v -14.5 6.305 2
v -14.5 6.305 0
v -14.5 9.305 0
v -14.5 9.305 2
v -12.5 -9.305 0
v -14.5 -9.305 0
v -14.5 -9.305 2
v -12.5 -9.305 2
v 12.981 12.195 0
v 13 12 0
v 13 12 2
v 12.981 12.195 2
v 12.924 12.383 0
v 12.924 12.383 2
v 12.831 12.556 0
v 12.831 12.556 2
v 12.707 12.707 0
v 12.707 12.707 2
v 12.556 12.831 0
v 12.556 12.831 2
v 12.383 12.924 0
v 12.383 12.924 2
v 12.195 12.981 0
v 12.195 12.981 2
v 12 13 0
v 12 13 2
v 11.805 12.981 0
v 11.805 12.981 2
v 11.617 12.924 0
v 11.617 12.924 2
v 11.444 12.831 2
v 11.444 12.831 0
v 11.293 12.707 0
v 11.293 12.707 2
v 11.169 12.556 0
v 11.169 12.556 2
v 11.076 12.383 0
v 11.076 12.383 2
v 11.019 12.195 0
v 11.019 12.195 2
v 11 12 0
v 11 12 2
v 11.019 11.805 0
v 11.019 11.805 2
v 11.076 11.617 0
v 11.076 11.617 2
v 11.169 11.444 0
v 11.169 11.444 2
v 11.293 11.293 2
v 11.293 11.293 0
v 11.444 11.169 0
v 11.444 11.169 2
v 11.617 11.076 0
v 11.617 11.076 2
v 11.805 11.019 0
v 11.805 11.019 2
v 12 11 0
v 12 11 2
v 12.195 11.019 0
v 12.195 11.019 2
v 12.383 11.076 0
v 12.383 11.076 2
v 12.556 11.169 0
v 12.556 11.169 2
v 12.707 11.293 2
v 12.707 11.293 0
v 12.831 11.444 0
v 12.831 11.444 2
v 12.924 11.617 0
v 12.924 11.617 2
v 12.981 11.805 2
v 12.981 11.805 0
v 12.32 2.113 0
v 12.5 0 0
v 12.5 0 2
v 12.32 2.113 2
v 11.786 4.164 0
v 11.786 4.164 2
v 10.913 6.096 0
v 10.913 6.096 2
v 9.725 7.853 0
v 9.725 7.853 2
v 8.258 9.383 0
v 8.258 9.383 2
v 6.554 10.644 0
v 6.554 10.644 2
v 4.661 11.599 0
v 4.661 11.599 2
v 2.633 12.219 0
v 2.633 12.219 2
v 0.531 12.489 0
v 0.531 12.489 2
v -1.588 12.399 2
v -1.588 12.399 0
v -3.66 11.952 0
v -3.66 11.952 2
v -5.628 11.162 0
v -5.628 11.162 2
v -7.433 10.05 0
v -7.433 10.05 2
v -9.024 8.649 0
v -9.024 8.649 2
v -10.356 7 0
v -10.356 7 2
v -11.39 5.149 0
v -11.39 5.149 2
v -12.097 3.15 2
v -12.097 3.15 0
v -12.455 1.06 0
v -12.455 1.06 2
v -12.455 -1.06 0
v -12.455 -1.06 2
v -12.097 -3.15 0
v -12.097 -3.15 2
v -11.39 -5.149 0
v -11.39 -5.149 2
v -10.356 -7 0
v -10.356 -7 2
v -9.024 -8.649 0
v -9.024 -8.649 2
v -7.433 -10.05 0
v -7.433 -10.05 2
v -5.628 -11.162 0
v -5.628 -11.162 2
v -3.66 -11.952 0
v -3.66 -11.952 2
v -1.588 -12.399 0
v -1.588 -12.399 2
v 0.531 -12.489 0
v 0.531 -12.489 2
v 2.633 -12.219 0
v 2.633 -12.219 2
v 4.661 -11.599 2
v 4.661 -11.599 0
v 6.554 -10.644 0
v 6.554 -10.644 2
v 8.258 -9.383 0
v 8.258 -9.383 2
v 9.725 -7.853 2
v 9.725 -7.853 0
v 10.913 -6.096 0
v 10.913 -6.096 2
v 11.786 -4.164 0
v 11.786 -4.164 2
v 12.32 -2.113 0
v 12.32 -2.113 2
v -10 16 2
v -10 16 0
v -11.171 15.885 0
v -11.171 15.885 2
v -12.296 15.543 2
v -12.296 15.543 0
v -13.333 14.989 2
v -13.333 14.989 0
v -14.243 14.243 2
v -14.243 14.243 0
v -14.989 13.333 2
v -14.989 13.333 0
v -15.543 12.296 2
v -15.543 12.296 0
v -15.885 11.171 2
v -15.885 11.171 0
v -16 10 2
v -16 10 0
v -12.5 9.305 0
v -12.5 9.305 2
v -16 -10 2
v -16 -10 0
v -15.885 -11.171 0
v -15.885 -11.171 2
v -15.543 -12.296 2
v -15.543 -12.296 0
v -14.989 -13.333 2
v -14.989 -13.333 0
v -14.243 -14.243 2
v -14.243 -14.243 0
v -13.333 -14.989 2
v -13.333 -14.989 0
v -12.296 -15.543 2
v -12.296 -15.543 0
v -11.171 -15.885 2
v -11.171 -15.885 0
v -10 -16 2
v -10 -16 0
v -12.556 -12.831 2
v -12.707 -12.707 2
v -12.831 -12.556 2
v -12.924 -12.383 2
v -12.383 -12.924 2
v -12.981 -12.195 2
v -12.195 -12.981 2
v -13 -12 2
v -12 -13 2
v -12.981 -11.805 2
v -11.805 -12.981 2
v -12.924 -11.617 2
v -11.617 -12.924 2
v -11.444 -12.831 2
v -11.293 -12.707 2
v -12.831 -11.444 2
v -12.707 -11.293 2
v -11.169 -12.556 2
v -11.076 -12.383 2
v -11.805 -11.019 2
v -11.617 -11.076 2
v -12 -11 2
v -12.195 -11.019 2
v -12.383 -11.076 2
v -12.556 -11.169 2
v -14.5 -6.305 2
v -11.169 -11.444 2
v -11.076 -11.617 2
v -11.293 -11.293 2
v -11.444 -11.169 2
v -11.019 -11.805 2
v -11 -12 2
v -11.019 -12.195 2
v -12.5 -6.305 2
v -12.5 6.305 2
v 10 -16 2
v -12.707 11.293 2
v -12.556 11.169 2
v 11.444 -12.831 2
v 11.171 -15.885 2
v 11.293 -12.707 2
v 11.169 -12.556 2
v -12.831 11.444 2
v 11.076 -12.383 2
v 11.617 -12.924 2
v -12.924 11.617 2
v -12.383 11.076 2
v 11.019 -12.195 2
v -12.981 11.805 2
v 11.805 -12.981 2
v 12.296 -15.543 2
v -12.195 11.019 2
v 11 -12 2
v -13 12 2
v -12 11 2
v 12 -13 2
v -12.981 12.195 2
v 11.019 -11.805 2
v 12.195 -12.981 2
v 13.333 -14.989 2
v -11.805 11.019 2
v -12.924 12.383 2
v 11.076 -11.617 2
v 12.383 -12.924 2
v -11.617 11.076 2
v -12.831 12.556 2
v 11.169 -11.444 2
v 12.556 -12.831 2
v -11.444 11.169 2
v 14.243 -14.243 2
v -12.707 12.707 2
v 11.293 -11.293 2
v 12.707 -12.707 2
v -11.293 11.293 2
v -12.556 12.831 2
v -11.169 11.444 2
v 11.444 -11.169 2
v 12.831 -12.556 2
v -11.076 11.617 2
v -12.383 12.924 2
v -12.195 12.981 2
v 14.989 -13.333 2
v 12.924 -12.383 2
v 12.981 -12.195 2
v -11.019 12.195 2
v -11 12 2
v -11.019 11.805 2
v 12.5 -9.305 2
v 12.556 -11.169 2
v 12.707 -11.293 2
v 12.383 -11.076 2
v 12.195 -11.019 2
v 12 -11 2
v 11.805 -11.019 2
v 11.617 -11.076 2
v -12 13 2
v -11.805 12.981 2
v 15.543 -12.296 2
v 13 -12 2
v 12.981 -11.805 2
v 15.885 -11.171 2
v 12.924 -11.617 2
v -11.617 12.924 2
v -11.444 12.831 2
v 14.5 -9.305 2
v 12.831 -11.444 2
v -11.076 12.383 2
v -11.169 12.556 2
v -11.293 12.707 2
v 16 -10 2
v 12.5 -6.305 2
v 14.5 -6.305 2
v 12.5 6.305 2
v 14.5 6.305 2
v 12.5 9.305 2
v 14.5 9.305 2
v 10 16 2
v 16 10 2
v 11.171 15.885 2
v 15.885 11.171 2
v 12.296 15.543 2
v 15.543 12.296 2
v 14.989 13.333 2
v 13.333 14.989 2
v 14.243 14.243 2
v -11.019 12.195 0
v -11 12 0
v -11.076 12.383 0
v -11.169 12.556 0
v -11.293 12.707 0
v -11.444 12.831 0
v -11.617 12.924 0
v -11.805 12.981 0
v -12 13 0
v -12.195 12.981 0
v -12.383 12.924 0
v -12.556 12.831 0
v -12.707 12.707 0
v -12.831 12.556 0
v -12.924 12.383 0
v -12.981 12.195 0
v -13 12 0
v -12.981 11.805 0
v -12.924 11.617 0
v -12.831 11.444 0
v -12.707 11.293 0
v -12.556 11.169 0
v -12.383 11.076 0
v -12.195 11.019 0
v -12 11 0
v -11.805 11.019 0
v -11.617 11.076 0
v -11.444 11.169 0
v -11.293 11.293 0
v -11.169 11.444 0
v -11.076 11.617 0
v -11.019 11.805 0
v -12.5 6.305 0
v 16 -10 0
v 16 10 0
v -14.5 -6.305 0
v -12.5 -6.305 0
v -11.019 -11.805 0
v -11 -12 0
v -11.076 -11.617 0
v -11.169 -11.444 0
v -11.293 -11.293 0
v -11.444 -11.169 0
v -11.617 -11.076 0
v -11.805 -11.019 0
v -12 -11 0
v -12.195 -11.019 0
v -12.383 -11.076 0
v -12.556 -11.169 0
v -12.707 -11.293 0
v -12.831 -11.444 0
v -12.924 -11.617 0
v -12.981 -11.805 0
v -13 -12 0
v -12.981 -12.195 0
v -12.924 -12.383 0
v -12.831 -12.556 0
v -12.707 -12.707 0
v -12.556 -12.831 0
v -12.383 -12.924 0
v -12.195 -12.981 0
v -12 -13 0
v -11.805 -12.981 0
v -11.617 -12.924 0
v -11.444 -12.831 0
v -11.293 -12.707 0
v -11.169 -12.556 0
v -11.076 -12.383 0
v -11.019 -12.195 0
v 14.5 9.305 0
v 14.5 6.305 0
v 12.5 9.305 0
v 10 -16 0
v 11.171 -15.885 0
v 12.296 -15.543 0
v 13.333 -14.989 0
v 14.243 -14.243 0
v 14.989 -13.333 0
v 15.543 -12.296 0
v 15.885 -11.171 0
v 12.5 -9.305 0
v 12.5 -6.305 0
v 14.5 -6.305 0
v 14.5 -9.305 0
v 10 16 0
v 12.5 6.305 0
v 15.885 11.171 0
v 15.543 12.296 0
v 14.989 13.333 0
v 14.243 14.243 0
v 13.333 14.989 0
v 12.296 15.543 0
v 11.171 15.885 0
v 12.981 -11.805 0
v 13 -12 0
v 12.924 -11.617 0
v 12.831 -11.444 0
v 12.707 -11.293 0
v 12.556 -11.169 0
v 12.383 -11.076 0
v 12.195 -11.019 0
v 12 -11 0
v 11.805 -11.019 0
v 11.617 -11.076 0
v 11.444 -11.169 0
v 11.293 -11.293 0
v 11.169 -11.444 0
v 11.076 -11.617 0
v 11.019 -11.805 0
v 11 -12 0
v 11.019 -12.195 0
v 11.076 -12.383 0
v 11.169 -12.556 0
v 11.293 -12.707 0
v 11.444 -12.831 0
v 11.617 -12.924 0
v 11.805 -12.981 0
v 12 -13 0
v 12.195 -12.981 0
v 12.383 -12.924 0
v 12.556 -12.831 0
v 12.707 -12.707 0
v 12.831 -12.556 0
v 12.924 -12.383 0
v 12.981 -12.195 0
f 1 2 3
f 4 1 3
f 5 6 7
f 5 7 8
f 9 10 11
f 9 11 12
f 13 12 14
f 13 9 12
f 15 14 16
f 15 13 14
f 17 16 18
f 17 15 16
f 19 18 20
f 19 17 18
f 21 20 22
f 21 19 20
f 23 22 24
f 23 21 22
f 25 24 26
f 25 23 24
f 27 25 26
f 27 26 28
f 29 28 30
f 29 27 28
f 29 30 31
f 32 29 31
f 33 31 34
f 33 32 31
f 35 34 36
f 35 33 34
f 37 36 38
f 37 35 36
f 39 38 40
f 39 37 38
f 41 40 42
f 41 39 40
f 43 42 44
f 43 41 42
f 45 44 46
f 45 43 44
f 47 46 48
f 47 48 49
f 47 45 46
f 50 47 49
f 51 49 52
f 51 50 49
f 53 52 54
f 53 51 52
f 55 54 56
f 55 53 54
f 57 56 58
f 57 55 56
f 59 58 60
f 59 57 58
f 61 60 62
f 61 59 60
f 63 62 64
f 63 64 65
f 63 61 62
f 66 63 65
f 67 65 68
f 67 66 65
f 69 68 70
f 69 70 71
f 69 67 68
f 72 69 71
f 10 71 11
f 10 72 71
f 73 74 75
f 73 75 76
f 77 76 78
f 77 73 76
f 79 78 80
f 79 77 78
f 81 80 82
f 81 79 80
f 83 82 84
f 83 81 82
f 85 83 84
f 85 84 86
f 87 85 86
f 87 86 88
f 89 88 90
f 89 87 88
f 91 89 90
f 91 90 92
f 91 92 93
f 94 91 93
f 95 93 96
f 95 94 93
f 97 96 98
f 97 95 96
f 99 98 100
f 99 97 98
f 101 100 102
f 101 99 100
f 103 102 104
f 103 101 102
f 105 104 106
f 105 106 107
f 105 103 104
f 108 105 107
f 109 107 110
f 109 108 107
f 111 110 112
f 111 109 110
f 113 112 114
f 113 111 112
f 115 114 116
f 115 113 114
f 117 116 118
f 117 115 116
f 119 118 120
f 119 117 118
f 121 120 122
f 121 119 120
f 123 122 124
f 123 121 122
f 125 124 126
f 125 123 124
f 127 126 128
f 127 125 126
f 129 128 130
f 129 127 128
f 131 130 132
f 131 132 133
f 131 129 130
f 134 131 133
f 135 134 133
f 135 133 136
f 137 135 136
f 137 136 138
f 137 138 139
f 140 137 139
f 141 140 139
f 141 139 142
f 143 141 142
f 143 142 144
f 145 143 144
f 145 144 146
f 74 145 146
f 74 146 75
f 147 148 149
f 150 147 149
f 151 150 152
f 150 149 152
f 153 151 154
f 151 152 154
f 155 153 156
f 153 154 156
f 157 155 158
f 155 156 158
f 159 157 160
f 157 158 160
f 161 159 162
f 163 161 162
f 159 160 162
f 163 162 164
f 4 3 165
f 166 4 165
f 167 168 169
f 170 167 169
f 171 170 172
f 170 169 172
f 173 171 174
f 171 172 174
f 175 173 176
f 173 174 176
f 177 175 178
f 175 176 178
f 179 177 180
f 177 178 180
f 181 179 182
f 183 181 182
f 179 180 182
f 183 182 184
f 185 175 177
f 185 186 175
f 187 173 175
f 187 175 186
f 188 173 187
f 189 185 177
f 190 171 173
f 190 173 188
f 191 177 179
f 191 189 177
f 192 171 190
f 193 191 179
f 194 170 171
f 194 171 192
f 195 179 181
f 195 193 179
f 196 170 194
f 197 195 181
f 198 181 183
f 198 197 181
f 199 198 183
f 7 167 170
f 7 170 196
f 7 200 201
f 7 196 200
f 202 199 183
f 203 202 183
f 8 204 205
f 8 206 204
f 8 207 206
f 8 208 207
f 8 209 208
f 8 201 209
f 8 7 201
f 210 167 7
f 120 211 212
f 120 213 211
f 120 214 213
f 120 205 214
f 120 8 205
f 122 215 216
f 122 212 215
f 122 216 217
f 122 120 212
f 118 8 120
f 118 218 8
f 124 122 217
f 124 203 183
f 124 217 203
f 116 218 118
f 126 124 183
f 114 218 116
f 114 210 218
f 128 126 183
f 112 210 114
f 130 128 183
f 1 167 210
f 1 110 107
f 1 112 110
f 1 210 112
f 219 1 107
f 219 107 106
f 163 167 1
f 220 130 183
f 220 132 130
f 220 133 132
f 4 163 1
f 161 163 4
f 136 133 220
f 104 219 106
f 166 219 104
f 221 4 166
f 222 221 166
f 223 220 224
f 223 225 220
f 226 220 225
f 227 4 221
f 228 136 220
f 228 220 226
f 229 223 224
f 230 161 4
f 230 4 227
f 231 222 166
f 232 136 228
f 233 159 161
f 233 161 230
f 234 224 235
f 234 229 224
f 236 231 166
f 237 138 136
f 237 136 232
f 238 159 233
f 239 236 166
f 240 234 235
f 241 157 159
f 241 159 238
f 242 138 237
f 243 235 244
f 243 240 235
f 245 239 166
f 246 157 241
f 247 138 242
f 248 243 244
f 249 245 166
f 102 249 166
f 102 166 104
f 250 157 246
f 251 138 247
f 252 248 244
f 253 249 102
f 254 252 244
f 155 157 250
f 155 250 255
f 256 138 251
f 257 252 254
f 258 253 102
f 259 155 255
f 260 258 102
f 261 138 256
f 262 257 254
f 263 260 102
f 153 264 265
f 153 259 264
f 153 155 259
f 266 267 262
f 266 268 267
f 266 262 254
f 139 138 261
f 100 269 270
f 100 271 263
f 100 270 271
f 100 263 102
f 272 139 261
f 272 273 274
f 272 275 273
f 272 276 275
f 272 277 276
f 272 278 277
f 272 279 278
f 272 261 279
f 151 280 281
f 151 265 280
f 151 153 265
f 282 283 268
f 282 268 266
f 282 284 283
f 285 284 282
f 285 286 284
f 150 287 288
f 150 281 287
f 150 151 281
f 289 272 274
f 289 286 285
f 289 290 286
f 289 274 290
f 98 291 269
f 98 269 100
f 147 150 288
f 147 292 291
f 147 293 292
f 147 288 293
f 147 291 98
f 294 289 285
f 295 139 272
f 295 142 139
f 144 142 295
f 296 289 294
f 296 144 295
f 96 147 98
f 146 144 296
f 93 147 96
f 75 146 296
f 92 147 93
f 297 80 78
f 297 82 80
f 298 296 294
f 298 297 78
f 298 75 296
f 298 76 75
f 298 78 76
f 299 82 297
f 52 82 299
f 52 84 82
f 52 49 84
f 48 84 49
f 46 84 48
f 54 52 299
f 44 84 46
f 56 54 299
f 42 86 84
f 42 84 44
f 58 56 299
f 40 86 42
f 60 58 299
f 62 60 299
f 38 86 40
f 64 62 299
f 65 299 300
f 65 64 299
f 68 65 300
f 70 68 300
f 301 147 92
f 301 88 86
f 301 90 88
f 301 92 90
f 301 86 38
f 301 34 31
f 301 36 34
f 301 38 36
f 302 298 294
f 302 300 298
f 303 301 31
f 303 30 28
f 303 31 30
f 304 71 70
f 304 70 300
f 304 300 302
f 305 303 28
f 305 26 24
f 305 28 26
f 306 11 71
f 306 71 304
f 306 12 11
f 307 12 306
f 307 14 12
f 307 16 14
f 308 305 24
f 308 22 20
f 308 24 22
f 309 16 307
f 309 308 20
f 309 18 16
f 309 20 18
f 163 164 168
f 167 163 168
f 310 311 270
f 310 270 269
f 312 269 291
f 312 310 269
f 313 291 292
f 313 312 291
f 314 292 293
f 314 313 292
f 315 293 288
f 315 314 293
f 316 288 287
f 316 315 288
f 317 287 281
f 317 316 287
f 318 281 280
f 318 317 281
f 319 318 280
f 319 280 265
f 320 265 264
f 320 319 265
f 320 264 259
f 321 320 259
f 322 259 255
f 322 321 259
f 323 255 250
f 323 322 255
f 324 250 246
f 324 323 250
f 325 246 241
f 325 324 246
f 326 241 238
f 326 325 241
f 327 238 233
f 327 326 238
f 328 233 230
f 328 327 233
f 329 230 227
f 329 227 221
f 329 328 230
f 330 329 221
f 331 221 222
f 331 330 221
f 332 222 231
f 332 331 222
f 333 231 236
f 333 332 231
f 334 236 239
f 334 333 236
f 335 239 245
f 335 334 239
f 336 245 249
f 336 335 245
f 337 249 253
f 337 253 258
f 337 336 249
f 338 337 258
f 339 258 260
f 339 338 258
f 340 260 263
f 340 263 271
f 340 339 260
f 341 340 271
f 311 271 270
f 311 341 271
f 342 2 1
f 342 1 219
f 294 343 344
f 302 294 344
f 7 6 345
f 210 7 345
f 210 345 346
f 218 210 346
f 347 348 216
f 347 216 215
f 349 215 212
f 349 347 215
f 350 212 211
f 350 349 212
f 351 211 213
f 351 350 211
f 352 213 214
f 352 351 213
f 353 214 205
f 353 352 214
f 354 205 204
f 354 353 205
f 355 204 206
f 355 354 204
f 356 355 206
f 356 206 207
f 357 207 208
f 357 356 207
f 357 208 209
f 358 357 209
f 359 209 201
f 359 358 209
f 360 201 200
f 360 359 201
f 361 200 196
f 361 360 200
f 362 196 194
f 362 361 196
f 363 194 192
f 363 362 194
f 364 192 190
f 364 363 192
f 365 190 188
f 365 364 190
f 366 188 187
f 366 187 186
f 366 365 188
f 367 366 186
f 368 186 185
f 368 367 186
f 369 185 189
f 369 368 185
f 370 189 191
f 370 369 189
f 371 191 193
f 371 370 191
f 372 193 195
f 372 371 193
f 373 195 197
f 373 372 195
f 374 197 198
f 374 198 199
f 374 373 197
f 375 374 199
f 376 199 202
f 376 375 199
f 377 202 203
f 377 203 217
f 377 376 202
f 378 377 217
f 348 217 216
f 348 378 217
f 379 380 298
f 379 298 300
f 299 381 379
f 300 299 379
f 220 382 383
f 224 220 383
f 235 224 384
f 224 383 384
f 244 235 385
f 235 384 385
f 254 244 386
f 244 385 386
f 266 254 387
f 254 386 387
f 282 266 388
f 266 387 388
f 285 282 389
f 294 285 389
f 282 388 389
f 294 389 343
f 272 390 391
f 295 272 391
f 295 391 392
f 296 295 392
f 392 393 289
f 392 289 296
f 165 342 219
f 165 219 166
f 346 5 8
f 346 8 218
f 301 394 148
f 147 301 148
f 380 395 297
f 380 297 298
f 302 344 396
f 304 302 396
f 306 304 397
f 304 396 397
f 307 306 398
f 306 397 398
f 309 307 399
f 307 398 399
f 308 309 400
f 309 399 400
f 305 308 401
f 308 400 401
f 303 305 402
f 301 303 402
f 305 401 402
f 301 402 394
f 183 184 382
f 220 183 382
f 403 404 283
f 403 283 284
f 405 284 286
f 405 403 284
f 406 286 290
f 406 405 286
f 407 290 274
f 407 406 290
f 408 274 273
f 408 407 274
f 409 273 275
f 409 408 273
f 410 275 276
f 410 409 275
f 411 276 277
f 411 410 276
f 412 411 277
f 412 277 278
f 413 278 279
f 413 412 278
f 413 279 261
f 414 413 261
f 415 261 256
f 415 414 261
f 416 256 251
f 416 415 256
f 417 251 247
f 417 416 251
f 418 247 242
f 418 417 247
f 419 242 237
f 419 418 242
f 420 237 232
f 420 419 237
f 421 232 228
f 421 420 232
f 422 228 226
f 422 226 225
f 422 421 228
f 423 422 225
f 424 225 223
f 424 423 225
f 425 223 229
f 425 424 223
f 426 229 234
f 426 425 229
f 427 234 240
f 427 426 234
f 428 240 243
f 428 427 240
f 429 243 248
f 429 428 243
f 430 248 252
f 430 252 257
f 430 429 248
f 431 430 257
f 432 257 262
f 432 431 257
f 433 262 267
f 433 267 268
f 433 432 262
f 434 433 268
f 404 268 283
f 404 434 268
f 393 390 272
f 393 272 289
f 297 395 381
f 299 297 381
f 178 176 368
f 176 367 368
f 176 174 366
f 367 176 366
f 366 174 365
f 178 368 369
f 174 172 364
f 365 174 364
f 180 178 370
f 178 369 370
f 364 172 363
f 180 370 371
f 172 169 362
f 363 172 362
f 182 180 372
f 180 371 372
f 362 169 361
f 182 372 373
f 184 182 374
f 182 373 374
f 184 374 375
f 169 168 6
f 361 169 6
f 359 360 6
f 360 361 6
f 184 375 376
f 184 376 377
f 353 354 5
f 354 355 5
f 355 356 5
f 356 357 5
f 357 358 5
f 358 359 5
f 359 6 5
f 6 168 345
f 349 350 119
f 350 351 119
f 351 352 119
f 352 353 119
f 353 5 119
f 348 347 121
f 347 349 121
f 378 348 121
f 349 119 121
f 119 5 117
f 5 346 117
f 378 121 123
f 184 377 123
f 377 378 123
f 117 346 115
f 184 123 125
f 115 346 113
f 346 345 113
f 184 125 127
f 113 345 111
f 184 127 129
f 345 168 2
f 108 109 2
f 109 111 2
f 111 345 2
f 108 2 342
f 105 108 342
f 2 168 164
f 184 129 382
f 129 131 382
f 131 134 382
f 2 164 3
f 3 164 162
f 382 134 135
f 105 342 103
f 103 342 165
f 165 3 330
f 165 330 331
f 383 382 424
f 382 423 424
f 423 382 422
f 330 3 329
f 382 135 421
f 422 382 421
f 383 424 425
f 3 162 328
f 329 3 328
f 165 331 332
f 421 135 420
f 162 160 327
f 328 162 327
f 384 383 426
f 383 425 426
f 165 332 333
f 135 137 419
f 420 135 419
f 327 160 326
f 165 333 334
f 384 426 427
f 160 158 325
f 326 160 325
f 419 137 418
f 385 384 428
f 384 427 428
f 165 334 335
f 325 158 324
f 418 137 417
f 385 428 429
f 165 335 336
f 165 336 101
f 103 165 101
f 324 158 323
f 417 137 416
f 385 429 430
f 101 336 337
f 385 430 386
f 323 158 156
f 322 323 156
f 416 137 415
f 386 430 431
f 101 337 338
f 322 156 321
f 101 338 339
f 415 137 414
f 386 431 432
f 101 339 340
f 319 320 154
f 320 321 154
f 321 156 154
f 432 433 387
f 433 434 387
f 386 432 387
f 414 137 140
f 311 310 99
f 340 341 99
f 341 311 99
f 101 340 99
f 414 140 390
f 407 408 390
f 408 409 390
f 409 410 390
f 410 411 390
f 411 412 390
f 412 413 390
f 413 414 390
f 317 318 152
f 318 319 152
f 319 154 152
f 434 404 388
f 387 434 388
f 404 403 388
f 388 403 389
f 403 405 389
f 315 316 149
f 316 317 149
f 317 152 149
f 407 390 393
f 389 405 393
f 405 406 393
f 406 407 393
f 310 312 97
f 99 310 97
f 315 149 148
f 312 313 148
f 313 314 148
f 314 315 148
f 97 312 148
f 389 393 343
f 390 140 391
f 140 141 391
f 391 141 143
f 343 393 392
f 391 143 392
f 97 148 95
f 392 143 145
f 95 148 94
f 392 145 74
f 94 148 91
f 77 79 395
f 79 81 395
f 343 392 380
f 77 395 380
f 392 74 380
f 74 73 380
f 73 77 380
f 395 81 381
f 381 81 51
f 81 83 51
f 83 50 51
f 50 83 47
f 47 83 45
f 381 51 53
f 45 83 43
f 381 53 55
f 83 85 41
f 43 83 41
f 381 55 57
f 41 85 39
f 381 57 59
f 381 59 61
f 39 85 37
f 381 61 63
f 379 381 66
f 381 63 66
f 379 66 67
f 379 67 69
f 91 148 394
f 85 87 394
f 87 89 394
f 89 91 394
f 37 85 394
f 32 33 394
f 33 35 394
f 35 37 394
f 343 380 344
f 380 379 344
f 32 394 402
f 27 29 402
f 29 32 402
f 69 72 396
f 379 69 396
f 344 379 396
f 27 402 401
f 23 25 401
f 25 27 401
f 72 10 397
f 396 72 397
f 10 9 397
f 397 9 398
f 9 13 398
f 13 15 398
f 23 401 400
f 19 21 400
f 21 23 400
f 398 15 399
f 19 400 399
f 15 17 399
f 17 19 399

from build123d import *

# Parameters (mm, degrees)
F0_R     = 1
F0_W     = 2
F0_H     = 3
F0_R_2   = 12.5
F1_DEPTH = 2
F2_DEPTH = 2


with BuildPart() as f1:
    # F0 (on Top) → F1 (new body)
    with BuildSketch(Plane.XY):
        with BuildLine():
            Line((10, 16), (-10, 16))
            ThreePointArc((-10, 16), (-14.2426406871, 14.2426406871), (-16, 10))
            Line((-16, 10), (-16, -10))
            ThreePointArc((-16, -10), (-14.2426406871, -14.2426406871), (-10, -16))
            Line((-10, -16), (10, -16))
            ThreePointArc((10, -16), (14.2426406871, -14.2426406871), (16, -10))
            Line((16, -10), (16, 10))
            ThreePointArc((16, 10), (14.2426406871, 14.2426406871), (10, 16))
        make_face()
        with Locations((-12, -12)):
            Circle(F0_R, mode=Mode.SUBTRACT)
        with Locations((-13.5, -7.8047601065)):
            Rectangle(F0_W, F0_H, mode=Mode.SUBTRACT)
        with Locations((12, -12)):
            Circle(F0_R, mode=Mode.SUBTRACT)
        with Locations((13.5, -7.8047601065)):
            Rectangle(F0_W, F0_H, mode=Mode.SUBTRACT)
        with Locations((-13.5, 7.8047601065)):
            Rectangle(F0_W, F0_H, mode=Mode.SUBTRACT)
        with Locations((-12, 12)):
            Circle(F0_R, mode=Mode.SUBTRACT)
        Circle(F0_R_2, mode=Mode.SUBTRACT)
        with Locations((13.5, 7.8047601065)):
            Rectangle(F0_W, F0_H, mode=Mode.SUBTRACT)
        with Locations((12, 12)):
            Circle(F0_R, mode=Mode.SUBTRACT)
    extrude(amount=F1_DEPTH)

    # F0 (on Top) → F2 (join)
    with BuildSketch(Plane.XY):
        with BuildLine():
            Line((10, 16), (-10, 16))
            ThreePointArc((-10, 16), (-14.2426406871, 14.2426406871), (-16, 10))
            Line((-16, 10), (-16, -10))
            ThreePointArc((-16, -10), (-14.2426406871, -14.2426406871), (-10, -16))
            Line((-10, -16), (10, -16))
            ThreePointArc((10, -16), (14.2426406871, -14.2426406871), (16, -10))
            Line((16, -10), (16, 10))
            ThreePointArc((16, 10), (14.2426406871, 14.2426406871), (10, 16))
        make_face()
        with Locations((-12, -12)):
            Circle(F0_R, mode=Mode.SUBTRACT)
        with Locations((-13.5, -7.8047601065)):
            Rectangle(F0_W, F0_H, mode=Mode.SUBTRACT)
        with Locations((12, -12)):
            Circle(F0_R, mode=Mode.SUBTRACT)
        with Locations((13.5, -7.8047601065)):
            Rectangle(F0_W, F0_H, mode=Mode.SUBTRACT)
        with Locations((-13.5, 7.8047601065)):
            Rectangle(F0_W, F0_H, mode=Mode.SUBTRACT)
        with Locations((-12, 12)):
            Circle(F0_R, mode=Mode.SUBTRACT)
        Circle(F0_R_2, mode=Mode.SUBTRACT)
        with Locations((13.5, 7.8047601065)):
            Rectangle(F0_W, F0_H, mode=Mode.SUBTRACT)
        with Locations((12, 12)):
            Circle(F0_R, mode=Mode.SUBTRACT)
    extrude(amount=F2_DEPTH)


solid = f1.part
